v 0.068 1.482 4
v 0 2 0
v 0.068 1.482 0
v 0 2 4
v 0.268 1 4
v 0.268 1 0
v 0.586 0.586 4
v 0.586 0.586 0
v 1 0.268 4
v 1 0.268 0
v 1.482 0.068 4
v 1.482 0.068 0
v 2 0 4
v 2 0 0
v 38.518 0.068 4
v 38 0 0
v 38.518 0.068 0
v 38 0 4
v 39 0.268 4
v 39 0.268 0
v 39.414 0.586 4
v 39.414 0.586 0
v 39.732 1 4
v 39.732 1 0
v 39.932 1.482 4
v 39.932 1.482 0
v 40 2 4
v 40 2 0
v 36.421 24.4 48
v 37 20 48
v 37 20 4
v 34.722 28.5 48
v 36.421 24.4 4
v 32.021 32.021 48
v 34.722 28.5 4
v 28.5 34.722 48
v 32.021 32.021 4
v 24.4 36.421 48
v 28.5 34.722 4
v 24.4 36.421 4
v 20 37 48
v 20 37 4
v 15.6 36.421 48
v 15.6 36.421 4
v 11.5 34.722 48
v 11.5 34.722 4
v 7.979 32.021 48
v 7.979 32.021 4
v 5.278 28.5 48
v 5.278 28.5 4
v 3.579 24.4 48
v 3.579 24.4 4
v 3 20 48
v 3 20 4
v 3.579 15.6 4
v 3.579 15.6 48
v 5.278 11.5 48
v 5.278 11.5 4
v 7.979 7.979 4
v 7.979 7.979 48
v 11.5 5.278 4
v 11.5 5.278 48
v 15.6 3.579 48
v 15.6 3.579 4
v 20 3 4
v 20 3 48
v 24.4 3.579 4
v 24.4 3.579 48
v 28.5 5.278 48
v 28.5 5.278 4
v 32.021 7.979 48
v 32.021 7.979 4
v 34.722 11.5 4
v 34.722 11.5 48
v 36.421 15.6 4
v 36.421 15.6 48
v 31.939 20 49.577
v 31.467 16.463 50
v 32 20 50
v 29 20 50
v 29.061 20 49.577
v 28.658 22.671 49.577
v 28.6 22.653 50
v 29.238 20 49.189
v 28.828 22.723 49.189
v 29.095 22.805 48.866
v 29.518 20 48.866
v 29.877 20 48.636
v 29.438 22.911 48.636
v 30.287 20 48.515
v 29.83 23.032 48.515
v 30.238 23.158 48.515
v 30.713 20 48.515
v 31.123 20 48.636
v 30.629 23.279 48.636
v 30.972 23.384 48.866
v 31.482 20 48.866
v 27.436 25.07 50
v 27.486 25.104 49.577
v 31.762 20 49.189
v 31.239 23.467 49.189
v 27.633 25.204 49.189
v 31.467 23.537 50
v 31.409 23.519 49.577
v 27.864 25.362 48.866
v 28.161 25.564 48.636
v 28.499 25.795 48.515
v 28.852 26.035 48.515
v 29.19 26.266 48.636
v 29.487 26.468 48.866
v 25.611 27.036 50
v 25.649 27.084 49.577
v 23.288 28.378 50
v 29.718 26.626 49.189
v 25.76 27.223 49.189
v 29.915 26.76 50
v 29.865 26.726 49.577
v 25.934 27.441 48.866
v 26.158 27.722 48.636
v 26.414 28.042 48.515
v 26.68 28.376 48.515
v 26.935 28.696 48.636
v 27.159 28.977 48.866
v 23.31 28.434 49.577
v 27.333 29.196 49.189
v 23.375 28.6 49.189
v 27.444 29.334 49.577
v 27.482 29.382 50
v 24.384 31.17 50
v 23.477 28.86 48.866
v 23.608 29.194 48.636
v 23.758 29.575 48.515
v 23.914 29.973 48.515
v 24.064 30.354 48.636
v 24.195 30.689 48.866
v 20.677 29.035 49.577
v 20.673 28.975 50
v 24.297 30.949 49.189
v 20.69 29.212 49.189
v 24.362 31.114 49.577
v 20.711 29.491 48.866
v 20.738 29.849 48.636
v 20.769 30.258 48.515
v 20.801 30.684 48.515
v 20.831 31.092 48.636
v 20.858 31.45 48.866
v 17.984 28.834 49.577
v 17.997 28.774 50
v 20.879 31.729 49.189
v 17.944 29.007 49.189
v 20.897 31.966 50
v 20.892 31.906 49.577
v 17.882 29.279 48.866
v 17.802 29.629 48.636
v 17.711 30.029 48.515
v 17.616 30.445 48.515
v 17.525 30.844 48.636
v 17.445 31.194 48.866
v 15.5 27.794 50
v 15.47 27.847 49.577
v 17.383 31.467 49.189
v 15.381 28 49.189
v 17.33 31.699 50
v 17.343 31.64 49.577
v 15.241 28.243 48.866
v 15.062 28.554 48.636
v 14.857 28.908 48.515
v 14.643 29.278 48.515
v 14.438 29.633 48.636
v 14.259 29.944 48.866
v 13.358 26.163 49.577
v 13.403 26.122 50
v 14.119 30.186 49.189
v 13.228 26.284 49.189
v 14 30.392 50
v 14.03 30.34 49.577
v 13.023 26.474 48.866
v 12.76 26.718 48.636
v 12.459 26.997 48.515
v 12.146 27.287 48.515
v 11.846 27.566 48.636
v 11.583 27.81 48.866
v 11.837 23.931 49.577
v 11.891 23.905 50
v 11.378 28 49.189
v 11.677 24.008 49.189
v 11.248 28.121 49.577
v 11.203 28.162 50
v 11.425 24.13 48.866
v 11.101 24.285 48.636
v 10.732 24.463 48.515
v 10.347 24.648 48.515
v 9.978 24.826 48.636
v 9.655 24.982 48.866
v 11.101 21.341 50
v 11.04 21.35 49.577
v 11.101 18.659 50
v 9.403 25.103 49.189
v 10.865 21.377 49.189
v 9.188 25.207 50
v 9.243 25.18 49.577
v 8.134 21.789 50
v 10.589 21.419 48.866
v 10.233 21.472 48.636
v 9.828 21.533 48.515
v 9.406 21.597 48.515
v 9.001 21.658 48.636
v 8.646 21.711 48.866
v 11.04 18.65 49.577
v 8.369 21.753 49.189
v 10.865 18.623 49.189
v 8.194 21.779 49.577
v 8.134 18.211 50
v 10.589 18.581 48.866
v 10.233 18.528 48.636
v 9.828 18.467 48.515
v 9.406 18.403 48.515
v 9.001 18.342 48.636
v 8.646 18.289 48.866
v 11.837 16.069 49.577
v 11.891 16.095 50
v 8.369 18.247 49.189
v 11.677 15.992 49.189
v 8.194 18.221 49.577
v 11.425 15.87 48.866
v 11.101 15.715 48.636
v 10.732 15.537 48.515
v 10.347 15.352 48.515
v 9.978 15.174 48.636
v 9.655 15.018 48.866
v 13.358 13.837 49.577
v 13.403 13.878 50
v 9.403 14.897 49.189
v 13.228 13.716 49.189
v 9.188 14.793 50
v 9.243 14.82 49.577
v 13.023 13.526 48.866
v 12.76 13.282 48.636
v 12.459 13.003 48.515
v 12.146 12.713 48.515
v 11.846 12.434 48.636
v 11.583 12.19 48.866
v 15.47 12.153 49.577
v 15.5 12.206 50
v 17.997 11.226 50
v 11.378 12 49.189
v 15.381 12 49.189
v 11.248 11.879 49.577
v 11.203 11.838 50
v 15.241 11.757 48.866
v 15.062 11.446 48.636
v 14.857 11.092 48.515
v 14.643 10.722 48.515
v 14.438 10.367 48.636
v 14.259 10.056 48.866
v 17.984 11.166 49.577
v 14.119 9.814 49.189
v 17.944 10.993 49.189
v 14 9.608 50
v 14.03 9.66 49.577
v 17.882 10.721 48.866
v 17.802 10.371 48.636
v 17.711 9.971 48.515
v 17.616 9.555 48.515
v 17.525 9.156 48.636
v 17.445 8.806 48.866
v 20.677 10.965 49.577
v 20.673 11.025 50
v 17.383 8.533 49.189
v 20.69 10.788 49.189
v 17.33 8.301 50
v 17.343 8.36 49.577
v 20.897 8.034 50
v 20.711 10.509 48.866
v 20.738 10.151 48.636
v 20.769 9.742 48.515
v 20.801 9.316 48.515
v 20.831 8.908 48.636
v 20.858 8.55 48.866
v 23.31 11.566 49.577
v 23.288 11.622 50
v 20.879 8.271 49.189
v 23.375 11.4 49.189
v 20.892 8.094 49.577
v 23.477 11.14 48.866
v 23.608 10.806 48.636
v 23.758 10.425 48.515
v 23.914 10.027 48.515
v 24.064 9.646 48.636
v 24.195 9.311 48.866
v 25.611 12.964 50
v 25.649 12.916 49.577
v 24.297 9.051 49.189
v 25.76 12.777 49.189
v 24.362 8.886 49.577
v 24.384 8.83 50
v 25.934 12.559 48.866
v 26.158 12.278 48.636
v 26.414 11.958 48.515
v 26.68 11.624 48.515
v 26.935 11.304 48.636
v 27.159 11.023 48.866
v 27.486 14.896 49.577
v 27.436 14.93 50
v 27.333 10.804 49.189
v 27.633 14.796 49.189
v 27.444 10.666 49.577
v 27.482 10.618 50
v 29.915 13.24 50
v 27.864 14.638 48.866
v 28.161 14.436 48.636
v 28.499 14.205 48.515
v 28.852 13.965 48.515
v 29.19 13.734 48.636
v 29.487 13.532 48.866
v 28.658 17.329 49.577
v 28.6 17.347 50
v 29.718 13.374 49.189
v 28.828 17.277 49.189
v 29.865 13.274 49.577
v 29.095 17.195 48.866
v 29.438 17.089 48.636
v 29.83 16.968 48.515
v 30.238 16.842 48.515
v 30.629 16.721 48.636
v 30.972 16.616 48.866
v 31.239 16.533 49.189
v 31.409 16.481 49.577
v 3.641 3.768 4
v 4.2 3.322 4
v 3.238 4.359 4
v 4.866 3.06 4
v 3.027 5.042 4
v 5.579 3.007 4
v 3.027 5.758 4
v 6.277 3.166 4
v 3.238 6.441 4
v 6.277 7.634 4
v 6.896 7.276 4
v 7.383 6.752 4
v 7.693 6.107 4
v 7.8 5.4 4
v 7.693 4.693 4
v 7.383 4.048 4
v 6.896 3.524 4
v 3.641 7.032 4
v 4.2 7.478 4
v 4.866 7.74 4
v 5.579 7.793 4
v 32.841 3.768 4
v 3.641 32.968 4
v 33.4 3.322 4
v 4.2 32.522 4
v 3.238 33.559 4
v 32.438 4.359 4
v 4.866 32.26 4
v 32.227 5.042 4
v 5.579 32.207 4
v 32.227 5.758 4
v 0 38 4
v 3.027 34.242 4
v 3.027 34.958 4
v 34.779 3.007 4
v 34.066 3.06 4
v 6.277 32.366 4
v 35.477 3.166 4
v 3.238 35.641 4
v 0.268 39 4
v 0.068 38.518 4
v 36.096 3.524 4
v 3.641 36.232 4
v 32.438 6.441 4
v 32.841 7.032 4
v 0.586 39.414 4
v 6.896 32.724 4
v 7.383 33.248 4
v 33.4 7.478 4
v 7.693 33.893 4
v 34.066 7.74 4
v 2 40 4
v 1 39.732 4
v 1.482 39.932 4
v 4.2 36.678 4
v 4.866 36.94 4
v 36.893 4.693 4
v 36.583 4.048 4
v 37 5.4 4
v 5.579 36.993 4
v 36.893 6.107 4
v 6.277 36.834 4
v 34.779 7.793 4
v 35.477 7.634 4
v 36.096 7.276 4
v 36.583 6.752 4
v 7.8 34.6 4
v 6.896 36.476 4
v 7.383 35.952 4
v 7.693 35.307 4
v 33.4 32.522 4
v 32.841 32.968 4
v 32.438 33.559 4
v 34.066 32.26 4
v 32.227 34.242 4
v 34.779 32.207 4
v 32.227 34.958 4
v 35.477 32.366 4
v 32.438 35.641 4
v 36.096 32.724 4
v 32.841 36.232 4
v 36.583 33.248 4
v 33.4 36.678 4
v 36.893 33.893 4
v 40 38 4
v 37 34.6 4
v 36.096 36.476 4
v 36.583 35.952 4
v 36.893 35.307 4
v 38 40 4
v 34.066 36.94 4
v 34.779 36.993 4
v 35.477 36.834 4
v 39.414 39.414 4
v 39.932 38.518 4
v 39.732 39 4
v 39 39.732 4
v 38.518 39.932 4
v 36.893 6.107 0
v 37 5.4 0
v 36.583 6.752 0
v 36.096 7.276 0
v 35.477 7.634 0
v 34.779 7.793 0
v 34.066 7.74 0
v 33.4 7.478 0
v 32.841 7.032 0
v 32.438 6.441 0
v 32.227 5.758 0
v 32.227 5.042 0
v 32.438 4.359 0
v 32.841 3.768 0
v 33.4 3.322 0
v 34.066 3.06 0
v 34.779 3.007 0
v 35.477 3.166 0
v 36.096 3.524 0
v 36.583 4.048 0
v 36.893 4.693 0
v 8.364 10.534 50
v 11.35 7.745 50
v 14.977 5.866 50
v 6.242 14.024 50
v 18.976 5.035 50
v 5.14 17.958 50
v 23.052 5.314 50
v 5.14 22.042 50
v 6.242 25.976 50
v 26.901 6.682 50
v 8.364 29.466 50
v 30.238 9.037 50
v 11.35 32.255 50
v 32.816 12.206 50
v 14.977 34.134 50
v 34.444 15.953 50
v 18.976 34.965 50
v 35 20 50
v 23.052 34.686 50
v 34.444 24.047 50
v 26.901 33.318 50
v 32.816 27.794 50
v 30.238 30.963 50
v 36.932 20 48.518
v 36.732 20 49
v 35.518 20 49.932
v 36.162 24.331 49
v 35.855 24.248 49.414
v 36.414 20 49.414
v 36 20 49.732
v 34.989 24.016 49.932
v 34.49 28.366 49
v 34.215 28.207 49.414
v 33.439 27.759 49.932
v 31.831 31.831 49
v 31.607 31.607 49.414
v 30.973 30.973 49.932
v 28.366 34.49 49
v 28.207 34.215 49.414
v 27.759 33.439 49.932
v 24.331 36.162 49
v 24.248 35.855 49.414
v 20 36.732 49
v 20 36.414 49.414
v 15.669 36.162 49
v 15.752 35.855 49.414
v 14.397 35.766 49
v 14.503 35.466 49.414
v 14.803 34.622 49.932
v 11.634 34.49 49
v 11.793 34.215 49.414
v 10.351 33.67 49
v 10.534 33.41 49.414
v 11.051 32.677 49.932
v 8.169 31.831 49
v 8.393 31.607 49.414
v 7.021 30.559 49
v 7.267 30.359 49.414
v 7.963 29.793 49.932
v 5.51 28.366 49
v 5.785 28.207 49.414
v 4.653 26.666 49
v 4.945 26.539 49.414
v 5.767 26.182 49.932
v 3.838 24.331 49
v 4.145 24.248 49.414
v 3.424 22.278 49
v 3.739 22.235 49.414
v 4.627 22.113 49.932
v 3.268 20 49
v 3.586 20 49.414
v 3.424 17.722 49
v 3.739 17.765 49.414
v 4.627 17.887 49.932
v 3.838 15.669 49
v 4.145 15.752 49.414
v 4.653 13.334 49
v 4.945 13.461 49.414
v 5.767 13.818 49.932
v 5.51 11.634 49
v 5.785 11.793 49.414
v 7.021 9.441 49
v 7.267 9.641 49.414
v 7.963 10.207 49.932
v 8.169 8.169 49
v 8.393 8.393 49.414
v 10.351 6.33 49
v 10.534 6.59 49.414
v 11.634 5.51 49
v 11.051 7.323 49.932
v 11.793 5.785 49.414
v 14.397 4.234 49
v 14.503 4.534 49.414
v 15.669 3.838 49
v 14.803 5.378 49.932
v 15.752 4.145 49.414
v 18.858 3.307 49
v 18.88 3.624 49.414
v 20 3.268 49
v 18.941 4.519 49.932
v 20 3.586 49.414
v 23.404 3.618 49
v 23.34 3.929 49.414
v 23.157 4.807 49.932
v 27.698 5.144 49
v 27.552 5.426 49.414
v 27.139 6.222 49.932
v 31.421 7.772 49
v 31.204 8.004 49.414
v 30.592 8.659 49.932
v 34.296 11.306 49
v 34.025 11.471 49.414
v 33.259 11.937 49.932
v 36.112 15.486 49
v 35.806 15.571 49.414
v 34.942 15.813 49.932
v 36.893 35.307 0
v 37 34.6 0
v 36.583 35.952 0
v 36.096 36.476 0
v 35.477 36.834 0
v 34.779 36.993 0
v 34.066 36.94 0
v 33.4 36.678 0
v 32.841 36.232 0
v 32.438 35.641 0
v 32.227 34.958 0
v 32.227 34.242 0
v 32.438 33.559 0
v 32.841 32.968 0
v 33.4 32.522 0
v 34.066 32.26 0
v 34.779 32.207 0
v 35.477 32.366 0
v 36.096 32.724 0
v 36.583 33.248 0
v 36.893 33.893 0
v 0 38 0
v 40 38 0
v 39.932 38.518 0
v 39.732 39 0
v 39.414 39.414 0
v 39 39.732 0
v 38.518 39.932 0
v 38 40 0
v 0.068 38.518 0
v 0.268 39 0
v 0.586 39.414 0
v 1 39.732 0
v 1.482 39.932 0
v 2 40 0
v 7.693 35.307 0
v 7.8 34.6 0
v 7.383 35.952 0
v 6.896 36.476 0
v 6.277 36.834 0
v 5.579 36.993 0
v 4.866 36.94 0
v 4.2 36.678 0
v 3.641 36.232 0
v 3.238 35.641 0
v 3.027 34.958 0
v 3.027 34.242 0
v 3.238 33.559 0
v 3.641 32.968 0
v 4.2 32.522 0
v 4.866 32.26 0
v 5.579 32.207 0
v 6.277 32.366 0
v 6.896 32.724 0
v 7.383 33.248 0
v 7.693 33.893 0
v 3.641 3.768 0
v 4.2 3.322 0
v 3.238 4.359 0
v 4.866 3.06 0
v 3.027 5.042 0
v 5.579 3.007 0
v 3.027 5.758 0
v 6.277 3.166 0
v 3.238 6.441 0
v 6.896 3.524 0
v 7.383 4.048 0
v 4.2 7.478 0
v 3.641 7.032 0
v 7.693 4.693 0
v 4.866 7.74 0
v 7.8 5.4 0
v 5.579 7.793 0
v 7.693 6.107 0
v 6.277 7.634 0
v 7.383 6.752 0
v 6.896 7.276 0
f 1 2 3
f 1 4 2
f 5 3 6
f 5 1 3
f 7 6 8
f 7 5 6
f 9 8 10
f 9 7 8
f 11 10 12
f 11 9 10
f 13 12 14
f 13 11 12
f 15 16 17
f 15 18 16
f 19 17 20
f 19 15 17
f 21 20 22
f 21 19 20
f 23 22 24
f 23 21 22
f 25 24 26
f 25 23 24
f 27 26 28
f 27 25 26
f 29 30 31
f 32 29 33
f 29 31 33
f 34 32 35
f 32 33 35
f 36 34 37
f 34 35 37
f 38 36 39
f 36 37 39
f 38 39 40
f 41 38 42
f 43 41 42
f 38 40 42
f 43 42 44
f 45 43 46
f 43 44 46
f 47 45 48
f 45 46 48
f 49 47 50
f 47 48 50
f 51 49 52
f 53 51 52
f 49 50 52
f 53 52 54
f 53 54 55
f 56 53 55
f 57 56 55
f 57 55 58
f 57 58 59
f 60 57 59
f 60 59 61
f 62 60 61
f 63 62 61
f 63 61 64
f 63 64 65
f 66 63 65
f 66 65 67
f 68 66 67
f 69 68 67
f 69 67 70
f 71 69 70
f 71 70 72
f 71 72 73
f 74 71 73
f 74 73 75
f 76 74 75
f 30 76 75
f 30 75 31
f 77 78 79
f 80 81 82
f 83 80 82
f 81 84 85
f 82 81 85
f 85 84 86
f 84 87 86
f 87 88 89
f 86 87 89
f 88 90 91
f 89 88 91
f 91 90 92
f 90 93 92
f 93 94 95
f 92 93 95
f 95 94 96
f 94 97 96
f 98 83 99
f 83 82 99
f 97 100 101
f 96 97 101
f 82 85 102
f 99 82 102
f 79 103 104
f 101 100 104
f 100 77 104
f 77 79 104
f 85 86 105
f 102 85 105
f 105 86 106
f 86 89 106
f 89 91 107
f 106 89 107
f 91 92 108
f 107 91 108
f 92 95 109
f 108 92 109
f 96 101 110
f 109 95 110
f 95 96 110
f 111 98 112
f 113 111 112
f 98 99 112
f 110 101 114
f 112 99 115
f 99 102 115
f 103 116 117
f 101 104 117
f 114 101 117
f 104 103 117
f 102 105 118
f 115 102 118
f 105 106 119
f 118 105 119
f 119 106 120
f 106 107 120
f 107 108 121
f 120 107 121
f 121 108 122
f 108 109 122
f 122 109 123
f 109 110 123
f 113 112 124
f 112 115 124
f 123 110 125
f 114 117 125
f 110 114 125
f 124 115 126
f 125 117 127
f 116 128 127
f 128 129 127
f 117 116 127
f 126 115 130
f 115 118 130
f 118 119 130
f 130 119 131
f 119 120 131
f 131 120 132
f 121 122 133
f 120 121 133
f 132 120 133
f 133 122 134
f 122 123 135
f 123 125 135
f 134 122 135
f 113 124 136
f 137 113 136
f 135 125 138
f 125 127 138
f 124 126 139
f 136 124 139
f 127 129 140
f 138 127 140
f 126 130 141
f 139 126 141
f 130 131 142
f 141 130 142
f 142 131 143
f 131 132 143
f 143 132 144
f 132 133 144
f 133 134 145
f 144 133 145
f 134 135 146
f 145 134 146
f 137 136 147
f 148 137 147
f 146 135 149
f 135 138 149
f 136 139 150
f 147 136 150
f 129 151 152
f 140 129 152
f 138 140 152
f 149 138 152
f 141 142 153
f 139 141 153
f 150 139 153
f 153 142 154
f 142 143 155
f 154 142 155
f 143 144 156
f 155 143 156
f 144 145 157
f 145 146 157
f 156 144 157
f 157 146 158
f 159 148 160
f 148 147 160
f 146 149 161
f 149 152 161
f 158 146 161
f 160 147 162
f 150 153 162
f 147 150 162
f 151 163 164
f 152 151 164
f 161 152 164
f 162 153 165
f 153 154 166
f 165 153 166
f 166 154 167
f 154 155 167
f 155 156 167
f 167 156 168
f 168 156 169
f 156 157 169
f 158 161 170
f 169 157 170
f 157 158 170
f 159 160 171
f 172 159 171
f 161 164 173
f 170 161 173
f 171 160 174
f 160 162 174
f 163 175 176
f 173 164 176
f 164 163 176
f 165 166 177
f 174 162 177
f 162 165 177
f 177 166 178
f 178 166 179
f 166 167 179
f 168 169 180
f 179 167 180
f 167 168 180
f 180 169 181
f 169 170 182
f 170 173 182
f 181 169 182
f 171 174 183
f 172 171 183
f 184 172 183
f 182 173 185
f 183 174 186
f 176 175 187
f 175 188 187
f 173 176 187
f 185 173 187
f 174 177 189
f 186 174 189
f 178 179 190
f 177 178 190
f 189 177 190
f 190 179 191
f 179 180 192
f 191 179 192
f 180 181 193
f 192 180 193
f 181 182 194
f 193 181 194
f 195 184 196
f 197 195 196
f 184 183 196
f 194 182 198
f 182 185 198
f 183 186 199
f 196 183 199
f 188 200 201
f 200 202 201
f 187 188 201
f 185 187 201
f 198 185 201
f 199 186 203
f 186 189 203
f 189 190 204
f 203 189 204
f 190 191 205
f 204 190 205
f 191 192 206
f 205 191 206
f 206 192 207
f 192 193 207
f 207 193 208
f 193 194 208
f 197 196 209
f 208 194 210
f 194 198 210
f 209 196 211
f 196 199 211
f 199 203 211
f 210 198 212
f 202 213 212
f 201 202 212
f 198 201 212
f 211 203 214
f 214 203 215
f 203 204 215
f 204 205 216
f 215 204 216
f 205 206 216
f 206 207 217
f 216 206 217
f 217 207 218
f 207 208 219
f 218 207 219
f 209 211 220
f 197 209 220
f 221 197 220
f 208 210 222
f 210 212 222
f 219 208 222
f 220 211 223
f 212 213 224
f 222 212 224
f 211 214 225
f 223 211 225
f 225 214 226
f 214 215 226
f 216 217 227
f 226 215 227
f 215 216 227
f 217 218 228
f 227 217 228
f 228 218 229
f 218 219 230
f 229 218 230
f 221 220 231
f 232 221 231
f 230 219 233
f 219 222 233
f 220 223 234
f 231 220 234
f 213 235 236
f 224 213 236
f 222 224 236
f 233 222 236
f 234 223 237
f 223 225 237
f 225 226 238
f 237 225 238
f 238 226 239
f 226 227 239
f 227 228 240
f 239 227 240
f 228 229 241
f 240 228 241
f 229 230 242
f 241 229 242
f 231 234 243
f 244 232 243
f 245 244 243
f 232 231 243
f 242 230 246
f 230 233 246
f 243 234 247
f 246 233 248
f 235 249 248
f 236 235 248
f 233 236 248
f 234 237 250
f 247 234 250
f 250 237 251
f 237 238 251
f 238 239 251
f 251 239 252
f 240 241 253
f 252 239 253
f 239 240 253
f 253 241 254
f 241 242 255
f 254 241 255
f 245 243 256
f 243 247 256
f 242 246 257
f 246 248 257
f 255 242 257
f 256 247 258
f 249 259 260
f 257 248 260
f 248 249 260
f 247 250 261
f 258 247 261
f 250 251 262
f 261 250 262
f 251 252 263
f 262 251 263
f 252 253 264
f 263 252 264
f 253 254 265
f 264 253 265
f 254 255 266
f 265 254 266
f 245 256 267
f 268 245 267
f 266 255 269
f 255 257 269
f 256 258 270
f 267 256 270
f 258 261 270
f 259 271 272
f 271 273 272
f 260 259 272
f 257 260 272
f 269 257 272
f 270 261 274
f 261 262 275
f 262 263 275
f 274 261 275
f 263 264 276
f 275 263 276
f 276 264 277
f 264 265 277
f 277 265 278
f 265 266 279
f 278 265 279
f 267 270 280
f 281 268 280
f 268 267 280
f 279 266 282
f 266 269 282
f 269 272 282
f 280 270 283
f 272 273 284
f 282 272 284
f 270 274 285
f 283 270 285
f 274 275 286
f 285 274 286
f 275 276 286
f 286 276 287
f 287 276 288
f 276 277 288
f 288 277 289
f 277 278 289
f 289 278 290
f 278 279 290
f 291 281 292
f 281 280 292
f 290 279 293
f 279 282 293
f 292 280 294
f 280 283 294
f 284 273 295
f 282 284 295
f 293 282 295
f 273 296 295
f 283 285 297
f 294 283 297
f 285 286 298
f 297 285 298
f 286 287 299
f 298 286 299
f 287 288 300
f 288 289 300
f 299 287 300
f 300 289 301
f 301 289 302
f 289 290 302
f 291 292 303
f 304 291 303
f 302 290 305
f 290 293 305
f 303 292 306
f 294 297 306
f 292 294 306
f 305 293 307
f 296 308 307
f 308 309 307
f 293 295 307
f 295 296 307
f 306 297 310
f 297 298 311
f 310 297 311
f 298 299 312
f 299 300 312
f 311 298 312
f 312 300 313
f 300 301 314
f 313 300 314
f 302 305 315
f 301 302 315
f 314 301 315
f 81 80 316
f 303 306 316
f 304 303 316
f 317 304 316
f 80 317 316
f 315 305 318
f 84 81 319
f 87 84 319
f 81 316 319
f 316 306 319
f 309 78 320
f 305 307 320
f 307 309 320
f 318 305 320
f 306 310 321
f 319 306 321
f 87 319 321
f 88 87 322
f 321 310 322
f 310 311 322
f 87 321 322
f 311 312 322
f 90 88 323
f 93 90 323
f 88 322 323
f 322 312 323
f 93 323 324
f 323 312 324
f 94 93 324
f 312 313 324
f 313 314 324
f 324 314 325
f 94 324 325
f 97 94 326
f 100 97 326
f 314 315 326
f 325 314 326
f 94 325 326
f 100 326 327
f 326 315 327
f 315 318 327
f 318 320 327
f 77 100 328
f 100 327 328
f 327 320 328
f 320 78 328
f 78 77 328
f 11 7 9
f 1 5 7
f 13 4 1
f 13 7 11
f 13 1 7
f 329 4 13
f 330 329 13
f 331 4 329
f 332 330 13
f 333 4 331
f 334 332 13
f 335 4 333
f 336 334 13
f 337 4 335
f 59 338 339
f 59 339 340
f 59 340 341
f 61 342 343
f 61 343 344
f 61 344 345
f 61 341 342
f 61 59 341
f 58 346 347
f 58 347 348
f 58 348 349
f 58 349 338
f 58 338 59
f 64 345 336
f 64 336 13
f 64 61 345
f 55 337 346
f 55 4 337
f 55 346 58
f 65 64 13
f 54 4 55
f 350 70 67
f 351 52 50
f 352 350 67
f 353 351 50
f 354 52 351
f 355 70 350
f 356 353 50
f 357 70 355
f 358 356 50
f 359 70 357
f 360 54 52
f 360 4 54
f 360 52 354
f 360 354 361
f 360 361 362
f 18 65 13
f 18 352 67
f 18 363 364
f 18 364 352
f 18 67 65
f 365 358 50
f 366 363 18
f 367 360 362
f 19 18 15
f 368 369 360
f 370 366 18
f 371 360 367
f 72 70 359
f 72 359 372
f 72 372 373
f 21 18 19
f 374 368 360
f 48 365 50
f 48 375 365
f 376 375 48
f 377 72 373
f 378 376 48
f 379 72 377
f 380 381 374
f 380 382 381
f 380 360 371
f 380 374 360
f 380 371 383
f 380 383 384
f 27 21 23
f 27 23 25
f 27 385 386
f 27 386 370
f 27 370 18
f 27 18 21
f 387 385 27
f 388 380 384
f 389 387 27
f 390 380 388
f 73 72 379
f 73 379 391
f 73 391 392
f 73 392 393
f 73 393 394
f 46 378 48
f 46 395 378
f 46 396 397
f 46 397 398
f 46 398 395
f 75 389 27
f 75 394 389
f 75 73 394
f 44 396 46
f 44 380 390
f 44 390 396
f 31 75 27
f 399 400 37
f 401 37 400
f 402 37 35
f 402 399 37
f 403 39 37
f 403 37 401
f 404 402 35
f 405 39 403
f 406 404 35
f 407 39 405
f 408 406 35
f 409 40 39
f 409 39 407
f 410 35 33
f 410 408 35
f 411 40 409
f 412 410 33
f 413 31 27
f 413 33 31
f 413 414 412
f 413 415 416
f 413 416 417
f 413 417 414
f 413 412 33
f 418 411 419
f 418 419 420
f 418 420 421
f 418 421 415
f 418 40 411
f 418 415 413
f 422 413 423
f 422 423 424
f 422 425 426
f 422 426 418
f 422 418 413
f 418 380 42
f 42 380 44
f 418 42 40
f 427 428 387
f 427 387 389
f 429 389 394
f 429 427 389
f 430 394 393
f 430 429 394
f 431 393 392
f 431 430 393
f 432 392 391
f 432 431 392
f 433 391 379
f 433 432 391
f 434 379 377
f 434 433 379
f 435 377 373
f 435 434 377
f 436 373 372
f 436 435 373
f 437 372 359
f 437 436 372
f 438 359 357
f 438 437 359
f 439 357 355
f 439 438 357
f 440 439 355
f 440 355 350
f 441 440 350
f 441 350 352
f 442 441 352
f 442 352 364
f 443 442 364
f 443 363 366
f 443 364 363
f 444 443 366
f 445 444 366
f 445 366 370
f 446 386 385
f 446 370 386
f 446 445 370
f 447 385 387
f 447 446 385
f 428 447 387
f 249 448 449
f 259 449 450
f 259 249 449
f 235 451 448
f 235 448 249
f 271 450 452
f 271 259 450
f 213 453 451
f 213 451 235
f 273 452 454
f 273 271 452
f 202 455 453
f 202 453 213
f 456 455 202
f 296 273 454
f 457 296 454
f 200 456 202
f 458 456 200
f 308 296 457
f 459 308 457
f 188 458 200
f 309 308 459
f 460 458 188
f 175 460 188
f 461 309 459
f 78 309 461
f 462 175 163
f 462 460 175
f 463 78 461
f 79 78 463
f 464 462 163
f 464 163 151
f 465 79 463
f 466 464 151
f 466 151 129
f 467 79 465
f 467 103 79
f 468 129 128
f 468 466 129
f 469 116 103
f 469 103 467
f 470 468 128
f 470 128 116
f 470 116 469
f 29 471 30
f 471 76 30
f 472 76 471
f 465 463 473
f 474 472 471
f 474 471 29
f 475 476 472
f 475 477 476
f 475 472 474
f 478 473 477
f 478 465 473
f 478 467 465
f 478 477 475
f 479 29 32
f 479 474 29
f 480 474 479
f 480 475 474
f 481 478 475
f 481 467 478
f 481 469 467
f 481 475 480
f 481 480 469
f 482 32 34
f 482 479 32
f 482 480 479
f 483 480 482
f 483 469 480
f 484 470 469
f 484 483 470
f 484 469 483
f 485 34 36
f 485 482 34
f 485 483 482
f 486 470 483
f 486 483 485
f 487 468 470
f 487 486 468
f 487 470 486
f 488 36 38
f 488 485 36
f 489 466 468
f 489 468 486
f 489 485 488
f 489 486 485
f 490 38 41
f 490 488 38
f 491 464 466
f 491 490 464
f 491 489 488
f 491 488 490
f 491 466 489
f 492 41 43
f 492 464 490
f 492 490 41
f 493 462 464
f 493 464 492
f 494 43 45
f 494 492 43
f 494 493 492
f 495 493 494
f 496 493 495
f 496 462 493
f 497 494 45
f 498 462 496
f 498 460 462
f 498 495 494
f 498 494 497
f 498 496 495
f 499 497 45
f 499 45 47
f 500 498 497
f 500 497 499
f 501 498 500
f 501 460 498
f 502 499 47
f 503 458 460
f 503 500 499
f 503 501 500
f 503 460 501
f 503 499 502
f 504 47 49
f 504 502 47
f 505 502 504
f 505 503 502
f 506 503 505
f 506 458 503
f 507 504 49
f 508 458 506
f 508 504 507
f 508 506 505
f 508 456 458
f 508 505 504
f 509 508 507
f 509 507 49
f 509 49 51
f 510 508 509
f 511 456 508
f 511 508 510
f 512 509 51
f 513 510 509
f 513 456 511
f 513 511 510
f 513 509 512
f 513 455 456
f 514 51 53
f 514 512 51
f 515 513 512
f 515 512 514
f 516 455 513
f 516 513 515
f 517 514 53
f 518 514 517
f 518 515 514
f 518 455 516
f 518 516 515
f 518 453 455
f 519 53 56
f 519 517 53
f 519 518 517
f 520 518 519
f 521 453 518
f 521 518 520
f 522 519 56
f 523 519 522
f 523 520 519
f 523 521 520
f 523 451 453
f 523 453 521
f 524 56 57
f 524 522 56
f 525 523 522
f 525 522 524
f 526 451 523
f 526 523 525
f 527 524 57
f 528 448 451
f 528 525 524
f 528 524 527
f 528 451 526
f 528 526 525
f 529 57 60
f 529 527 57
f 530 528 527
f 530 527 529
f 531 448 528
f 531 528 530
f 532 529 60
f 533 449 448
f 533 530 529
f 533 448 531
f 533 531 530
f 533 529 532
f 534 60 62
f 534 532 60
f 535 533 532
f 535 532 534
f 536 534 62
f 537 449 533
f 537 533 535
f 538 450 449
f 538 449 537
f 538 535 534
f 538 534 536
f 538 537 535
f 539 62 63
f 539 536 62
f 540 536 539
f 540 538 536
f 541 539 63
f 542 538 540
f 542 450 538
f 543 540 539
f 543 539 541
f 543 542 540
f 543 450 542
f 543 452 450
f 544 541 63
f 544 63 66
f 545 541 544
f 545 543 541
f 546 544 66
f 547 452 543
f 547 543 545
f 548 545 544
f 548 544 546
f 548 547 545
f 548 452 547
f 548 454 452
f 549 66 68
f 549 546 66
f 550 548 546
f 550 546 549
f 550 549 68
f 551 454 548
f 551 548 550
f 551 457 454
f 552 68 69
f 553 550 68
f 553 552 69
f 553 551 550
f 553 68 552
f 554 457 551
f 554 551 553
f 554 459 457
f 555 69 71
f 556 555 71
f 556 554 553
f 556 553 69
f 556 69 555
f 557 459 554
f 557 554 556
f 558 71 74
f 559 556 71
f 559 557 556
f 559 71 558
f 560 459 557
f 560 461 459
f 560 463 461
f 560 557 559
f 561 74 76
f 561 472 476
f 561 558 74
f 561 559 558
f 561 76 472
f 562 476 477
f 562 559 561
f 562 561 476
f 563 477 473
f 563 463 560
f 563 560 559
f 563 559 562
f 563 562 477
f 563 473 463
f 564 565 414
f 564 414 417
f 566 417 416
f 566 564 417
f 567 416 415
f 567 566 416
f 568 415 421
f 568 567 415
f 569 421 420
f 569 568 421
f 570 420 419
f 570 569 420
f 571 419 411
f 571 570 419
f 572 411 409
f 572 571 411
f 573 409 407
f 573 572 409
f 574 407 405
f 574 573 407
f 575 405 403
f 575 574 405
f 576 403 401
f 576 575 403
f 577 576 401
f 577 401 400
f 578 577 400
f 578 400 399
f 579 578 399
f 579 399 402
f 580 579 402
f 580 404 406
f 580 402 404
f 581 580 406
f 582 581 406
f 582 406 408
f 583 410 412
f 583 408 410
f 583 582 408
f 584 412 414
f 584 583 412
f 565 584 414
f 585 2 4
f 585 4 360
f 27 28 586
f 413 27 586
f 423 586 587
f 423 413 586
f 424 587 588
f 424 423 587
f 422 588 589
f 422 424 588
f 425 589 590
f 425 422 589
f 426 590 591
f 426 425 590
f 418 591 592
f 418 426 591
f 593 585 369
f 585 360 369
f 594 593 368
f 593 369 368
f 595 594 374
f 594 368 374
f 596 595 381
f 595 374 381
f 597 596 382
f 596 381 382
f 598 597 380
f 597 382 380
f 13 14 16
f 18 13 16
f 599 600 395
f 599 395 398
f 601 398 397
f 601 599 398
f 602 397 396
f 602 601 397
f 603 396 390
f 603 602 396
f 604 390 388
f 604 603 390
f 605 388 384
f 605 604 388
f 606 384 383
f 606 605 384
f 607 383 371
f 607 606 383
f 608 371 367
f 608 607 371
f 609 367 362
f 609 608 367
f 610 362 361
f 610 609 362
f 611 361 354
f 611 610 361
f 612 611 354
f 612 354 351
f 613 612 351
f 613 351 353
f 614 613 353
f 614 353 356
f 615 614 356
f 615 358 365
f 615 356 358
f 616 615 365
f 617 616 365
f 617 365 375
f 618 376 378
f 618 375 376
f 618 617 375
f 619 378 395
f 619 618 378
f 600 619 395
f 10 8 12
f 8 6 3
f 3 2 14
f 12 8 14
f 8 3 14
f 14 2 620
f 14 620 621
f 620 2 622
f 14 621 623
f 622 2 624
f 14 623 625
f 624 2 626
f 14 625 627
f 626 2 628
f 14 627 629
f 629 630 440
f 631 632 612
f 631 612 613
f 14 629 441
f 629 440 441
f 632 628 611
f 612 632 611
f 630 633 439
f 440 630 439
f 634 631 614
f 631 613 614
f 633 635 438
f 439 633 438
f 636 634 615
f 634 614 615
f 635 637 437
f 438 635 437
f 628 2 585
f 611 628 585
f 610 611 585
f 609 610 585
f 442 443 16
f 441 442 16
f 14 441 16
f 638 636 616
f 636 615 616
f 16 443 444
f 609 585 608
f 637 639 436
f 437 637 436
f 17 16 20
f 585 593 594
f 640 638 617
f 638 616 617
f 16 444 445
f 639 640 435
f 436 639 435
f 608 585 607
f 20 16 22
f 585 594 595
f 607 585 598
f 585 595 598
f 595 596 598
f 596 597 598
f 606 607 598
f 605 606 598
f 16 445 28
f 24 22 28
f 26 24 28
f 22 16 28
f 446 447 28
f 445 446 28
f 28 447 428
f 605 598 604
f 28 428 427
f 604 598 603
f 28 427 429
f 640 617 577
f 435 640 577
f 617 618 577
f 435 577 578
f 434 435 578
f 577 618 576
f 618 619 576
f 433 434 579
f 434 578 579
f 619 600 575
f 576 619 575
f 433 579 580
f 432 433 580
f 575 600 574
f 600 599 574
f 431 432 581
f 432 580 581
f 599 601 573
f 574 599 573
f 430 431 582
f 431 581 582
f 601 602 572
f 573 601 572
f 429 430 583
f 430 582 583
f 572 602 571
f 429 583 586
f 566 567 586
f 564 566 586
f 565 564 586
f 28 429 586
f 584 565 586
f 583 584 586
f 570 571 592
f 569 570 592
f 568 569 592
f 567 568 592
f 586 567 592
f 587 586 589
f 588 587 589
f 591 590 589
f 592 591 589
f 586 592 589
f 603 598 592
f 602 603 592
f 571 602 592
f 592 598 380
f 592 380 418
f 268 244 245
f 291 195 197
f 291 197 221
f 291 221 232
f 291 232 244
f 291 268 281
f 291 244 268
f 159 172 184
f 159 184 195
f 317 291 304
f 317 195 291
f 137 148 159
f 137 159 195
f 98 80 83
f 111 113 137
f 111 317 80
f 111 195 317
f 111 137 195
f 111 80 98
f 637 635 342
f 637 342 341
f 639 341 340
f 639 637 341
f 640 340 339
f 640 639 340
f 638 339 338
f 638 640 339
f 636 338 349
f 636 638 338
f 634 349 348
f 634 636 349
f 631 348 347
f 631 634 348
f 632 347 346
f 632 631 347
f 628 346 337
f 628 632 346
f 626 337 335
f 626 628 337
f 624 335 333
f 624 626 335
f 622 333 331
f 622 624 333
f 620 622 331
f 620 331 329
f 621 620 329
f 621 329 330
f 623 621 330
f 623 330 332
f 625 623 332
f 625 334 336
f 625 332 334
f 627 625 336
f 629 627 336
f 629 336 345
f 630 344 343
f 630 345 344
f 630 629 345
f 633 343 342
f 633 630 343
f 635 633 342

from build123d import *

# Parameters (mm, degrees)
CYLINDER_R        = 2.4
CYLINDER_DEPTH    = 10
ARRAY_X_COUNT     = 2
ARRAY_X_PITCH     = 29.2
ARRAY_Y_COUNT     = 2
ARRAY_Y_PITCH     = 29.2
BOX_W             = 40
BOX_H             = 40
BOX_DEPTH         = 4
FILLET_R          = 2
TORUS_R           = 1.5
CYLINDER001_R     = 17
CYLINDER001_DEPTH = 50
FILLET001_R       = 2


with BuildPart() as taladros_vector:
    # Cylinder → Cylinder (new body)
    with BuildSketch(Plane(origin=(5.4, 5.4, 0), x_dir=(1, 0, 0), z_dir=(0, 0, 1))):
        Circle(CYLINDER_R)
    extrude(amount=CYLINDER_DEPTH)

    # Array X: taladros_vector ×2


with BuildPart() as taladros_vector_1:
    add(taladros_vector.part)
    with Locations(*[(i * ARRAY_X_PITCH, 0, 0) for i in range(1, ARRAY_X_COUNT)]):
        add(taladros_vector.part)

    # Array Y: taladros_vector ×2


with BuildPart() as taladros_vector_2:
    add(taladros_vector_1.part)
    with Locations(*[(0, i * ARRAY_Y_PITCH, 0) for i in range(1, ARRAY_Y_COUNT)]):
        add(taladros_vector_1.part)


with BuildPart() as taladros_vector_3:
    # Array placement: moved
    add(taladros_vector_2.part.moved(Location((0, 0, -3))))


with BuildPart() as base_taladrada:
    # Box → Box (new body)
    with BuildSketch(Plane.XY):
        with Locations((20, 20)):
            Rectangle(BOX_W, BOX_H)
    extrude(amount=BOX_DEPTH)

    # Fillet
    fillet_edges = [base_taladrada.edges().sort_by_distance(p)[0] for p in [
        (0, 0, 2),
        (0, 40, 2),
        (40, 0, 2),
        (40, 40, 2),
    ]]
    fillet(fillet_edges, radius=FILLET_R)

    # Cut: cut taladros_vector
    add(taladros_vector_3.part, mode=Mode.SUBTRACT)


with BuildPart() as hueco_torica:
    # Torus → Torus (revolve)
    with BuildSketch(Plane(origin=(0, 0, 50), x_dir=(1, 0, 0), z_dir=(0, -1, 0))):
        with Locations((10.5, 0)):
            Circle(TORUS_R)
    revolve(axis=Axis((0, 0, 50), (0, 0, 1)))


with BuildPart() as pata_ikea:
    # Cylinder001 → Cylinder001 (new body)
    with BuildSketch(Plane.XY):
        Circle(CYLINDER001_R)
    extrude(amount=CYLINDER001_DEPTH)

    # Fillet001
    fillet001_edges = [pata_ikea.edges().sort_by_distance(p)[0] for p in [
        (-17, 0, 50),
    ]]
    fillet(fillet001_edges, radius=FILLET001_R)

    # Cut001: cut hueco_torica
    add(hueco_torica.part, mode=Mode.SUBTRACT)


with BuildPart() as pata_ikea_1:
    # Cut001 placement: moved
    add(pata_ikea.part.moved(Location((20, 20, 0))))

    # Fusion: union base_taladrada
    add(base_taladrada.part)


solid = pata_ikea_1.part
